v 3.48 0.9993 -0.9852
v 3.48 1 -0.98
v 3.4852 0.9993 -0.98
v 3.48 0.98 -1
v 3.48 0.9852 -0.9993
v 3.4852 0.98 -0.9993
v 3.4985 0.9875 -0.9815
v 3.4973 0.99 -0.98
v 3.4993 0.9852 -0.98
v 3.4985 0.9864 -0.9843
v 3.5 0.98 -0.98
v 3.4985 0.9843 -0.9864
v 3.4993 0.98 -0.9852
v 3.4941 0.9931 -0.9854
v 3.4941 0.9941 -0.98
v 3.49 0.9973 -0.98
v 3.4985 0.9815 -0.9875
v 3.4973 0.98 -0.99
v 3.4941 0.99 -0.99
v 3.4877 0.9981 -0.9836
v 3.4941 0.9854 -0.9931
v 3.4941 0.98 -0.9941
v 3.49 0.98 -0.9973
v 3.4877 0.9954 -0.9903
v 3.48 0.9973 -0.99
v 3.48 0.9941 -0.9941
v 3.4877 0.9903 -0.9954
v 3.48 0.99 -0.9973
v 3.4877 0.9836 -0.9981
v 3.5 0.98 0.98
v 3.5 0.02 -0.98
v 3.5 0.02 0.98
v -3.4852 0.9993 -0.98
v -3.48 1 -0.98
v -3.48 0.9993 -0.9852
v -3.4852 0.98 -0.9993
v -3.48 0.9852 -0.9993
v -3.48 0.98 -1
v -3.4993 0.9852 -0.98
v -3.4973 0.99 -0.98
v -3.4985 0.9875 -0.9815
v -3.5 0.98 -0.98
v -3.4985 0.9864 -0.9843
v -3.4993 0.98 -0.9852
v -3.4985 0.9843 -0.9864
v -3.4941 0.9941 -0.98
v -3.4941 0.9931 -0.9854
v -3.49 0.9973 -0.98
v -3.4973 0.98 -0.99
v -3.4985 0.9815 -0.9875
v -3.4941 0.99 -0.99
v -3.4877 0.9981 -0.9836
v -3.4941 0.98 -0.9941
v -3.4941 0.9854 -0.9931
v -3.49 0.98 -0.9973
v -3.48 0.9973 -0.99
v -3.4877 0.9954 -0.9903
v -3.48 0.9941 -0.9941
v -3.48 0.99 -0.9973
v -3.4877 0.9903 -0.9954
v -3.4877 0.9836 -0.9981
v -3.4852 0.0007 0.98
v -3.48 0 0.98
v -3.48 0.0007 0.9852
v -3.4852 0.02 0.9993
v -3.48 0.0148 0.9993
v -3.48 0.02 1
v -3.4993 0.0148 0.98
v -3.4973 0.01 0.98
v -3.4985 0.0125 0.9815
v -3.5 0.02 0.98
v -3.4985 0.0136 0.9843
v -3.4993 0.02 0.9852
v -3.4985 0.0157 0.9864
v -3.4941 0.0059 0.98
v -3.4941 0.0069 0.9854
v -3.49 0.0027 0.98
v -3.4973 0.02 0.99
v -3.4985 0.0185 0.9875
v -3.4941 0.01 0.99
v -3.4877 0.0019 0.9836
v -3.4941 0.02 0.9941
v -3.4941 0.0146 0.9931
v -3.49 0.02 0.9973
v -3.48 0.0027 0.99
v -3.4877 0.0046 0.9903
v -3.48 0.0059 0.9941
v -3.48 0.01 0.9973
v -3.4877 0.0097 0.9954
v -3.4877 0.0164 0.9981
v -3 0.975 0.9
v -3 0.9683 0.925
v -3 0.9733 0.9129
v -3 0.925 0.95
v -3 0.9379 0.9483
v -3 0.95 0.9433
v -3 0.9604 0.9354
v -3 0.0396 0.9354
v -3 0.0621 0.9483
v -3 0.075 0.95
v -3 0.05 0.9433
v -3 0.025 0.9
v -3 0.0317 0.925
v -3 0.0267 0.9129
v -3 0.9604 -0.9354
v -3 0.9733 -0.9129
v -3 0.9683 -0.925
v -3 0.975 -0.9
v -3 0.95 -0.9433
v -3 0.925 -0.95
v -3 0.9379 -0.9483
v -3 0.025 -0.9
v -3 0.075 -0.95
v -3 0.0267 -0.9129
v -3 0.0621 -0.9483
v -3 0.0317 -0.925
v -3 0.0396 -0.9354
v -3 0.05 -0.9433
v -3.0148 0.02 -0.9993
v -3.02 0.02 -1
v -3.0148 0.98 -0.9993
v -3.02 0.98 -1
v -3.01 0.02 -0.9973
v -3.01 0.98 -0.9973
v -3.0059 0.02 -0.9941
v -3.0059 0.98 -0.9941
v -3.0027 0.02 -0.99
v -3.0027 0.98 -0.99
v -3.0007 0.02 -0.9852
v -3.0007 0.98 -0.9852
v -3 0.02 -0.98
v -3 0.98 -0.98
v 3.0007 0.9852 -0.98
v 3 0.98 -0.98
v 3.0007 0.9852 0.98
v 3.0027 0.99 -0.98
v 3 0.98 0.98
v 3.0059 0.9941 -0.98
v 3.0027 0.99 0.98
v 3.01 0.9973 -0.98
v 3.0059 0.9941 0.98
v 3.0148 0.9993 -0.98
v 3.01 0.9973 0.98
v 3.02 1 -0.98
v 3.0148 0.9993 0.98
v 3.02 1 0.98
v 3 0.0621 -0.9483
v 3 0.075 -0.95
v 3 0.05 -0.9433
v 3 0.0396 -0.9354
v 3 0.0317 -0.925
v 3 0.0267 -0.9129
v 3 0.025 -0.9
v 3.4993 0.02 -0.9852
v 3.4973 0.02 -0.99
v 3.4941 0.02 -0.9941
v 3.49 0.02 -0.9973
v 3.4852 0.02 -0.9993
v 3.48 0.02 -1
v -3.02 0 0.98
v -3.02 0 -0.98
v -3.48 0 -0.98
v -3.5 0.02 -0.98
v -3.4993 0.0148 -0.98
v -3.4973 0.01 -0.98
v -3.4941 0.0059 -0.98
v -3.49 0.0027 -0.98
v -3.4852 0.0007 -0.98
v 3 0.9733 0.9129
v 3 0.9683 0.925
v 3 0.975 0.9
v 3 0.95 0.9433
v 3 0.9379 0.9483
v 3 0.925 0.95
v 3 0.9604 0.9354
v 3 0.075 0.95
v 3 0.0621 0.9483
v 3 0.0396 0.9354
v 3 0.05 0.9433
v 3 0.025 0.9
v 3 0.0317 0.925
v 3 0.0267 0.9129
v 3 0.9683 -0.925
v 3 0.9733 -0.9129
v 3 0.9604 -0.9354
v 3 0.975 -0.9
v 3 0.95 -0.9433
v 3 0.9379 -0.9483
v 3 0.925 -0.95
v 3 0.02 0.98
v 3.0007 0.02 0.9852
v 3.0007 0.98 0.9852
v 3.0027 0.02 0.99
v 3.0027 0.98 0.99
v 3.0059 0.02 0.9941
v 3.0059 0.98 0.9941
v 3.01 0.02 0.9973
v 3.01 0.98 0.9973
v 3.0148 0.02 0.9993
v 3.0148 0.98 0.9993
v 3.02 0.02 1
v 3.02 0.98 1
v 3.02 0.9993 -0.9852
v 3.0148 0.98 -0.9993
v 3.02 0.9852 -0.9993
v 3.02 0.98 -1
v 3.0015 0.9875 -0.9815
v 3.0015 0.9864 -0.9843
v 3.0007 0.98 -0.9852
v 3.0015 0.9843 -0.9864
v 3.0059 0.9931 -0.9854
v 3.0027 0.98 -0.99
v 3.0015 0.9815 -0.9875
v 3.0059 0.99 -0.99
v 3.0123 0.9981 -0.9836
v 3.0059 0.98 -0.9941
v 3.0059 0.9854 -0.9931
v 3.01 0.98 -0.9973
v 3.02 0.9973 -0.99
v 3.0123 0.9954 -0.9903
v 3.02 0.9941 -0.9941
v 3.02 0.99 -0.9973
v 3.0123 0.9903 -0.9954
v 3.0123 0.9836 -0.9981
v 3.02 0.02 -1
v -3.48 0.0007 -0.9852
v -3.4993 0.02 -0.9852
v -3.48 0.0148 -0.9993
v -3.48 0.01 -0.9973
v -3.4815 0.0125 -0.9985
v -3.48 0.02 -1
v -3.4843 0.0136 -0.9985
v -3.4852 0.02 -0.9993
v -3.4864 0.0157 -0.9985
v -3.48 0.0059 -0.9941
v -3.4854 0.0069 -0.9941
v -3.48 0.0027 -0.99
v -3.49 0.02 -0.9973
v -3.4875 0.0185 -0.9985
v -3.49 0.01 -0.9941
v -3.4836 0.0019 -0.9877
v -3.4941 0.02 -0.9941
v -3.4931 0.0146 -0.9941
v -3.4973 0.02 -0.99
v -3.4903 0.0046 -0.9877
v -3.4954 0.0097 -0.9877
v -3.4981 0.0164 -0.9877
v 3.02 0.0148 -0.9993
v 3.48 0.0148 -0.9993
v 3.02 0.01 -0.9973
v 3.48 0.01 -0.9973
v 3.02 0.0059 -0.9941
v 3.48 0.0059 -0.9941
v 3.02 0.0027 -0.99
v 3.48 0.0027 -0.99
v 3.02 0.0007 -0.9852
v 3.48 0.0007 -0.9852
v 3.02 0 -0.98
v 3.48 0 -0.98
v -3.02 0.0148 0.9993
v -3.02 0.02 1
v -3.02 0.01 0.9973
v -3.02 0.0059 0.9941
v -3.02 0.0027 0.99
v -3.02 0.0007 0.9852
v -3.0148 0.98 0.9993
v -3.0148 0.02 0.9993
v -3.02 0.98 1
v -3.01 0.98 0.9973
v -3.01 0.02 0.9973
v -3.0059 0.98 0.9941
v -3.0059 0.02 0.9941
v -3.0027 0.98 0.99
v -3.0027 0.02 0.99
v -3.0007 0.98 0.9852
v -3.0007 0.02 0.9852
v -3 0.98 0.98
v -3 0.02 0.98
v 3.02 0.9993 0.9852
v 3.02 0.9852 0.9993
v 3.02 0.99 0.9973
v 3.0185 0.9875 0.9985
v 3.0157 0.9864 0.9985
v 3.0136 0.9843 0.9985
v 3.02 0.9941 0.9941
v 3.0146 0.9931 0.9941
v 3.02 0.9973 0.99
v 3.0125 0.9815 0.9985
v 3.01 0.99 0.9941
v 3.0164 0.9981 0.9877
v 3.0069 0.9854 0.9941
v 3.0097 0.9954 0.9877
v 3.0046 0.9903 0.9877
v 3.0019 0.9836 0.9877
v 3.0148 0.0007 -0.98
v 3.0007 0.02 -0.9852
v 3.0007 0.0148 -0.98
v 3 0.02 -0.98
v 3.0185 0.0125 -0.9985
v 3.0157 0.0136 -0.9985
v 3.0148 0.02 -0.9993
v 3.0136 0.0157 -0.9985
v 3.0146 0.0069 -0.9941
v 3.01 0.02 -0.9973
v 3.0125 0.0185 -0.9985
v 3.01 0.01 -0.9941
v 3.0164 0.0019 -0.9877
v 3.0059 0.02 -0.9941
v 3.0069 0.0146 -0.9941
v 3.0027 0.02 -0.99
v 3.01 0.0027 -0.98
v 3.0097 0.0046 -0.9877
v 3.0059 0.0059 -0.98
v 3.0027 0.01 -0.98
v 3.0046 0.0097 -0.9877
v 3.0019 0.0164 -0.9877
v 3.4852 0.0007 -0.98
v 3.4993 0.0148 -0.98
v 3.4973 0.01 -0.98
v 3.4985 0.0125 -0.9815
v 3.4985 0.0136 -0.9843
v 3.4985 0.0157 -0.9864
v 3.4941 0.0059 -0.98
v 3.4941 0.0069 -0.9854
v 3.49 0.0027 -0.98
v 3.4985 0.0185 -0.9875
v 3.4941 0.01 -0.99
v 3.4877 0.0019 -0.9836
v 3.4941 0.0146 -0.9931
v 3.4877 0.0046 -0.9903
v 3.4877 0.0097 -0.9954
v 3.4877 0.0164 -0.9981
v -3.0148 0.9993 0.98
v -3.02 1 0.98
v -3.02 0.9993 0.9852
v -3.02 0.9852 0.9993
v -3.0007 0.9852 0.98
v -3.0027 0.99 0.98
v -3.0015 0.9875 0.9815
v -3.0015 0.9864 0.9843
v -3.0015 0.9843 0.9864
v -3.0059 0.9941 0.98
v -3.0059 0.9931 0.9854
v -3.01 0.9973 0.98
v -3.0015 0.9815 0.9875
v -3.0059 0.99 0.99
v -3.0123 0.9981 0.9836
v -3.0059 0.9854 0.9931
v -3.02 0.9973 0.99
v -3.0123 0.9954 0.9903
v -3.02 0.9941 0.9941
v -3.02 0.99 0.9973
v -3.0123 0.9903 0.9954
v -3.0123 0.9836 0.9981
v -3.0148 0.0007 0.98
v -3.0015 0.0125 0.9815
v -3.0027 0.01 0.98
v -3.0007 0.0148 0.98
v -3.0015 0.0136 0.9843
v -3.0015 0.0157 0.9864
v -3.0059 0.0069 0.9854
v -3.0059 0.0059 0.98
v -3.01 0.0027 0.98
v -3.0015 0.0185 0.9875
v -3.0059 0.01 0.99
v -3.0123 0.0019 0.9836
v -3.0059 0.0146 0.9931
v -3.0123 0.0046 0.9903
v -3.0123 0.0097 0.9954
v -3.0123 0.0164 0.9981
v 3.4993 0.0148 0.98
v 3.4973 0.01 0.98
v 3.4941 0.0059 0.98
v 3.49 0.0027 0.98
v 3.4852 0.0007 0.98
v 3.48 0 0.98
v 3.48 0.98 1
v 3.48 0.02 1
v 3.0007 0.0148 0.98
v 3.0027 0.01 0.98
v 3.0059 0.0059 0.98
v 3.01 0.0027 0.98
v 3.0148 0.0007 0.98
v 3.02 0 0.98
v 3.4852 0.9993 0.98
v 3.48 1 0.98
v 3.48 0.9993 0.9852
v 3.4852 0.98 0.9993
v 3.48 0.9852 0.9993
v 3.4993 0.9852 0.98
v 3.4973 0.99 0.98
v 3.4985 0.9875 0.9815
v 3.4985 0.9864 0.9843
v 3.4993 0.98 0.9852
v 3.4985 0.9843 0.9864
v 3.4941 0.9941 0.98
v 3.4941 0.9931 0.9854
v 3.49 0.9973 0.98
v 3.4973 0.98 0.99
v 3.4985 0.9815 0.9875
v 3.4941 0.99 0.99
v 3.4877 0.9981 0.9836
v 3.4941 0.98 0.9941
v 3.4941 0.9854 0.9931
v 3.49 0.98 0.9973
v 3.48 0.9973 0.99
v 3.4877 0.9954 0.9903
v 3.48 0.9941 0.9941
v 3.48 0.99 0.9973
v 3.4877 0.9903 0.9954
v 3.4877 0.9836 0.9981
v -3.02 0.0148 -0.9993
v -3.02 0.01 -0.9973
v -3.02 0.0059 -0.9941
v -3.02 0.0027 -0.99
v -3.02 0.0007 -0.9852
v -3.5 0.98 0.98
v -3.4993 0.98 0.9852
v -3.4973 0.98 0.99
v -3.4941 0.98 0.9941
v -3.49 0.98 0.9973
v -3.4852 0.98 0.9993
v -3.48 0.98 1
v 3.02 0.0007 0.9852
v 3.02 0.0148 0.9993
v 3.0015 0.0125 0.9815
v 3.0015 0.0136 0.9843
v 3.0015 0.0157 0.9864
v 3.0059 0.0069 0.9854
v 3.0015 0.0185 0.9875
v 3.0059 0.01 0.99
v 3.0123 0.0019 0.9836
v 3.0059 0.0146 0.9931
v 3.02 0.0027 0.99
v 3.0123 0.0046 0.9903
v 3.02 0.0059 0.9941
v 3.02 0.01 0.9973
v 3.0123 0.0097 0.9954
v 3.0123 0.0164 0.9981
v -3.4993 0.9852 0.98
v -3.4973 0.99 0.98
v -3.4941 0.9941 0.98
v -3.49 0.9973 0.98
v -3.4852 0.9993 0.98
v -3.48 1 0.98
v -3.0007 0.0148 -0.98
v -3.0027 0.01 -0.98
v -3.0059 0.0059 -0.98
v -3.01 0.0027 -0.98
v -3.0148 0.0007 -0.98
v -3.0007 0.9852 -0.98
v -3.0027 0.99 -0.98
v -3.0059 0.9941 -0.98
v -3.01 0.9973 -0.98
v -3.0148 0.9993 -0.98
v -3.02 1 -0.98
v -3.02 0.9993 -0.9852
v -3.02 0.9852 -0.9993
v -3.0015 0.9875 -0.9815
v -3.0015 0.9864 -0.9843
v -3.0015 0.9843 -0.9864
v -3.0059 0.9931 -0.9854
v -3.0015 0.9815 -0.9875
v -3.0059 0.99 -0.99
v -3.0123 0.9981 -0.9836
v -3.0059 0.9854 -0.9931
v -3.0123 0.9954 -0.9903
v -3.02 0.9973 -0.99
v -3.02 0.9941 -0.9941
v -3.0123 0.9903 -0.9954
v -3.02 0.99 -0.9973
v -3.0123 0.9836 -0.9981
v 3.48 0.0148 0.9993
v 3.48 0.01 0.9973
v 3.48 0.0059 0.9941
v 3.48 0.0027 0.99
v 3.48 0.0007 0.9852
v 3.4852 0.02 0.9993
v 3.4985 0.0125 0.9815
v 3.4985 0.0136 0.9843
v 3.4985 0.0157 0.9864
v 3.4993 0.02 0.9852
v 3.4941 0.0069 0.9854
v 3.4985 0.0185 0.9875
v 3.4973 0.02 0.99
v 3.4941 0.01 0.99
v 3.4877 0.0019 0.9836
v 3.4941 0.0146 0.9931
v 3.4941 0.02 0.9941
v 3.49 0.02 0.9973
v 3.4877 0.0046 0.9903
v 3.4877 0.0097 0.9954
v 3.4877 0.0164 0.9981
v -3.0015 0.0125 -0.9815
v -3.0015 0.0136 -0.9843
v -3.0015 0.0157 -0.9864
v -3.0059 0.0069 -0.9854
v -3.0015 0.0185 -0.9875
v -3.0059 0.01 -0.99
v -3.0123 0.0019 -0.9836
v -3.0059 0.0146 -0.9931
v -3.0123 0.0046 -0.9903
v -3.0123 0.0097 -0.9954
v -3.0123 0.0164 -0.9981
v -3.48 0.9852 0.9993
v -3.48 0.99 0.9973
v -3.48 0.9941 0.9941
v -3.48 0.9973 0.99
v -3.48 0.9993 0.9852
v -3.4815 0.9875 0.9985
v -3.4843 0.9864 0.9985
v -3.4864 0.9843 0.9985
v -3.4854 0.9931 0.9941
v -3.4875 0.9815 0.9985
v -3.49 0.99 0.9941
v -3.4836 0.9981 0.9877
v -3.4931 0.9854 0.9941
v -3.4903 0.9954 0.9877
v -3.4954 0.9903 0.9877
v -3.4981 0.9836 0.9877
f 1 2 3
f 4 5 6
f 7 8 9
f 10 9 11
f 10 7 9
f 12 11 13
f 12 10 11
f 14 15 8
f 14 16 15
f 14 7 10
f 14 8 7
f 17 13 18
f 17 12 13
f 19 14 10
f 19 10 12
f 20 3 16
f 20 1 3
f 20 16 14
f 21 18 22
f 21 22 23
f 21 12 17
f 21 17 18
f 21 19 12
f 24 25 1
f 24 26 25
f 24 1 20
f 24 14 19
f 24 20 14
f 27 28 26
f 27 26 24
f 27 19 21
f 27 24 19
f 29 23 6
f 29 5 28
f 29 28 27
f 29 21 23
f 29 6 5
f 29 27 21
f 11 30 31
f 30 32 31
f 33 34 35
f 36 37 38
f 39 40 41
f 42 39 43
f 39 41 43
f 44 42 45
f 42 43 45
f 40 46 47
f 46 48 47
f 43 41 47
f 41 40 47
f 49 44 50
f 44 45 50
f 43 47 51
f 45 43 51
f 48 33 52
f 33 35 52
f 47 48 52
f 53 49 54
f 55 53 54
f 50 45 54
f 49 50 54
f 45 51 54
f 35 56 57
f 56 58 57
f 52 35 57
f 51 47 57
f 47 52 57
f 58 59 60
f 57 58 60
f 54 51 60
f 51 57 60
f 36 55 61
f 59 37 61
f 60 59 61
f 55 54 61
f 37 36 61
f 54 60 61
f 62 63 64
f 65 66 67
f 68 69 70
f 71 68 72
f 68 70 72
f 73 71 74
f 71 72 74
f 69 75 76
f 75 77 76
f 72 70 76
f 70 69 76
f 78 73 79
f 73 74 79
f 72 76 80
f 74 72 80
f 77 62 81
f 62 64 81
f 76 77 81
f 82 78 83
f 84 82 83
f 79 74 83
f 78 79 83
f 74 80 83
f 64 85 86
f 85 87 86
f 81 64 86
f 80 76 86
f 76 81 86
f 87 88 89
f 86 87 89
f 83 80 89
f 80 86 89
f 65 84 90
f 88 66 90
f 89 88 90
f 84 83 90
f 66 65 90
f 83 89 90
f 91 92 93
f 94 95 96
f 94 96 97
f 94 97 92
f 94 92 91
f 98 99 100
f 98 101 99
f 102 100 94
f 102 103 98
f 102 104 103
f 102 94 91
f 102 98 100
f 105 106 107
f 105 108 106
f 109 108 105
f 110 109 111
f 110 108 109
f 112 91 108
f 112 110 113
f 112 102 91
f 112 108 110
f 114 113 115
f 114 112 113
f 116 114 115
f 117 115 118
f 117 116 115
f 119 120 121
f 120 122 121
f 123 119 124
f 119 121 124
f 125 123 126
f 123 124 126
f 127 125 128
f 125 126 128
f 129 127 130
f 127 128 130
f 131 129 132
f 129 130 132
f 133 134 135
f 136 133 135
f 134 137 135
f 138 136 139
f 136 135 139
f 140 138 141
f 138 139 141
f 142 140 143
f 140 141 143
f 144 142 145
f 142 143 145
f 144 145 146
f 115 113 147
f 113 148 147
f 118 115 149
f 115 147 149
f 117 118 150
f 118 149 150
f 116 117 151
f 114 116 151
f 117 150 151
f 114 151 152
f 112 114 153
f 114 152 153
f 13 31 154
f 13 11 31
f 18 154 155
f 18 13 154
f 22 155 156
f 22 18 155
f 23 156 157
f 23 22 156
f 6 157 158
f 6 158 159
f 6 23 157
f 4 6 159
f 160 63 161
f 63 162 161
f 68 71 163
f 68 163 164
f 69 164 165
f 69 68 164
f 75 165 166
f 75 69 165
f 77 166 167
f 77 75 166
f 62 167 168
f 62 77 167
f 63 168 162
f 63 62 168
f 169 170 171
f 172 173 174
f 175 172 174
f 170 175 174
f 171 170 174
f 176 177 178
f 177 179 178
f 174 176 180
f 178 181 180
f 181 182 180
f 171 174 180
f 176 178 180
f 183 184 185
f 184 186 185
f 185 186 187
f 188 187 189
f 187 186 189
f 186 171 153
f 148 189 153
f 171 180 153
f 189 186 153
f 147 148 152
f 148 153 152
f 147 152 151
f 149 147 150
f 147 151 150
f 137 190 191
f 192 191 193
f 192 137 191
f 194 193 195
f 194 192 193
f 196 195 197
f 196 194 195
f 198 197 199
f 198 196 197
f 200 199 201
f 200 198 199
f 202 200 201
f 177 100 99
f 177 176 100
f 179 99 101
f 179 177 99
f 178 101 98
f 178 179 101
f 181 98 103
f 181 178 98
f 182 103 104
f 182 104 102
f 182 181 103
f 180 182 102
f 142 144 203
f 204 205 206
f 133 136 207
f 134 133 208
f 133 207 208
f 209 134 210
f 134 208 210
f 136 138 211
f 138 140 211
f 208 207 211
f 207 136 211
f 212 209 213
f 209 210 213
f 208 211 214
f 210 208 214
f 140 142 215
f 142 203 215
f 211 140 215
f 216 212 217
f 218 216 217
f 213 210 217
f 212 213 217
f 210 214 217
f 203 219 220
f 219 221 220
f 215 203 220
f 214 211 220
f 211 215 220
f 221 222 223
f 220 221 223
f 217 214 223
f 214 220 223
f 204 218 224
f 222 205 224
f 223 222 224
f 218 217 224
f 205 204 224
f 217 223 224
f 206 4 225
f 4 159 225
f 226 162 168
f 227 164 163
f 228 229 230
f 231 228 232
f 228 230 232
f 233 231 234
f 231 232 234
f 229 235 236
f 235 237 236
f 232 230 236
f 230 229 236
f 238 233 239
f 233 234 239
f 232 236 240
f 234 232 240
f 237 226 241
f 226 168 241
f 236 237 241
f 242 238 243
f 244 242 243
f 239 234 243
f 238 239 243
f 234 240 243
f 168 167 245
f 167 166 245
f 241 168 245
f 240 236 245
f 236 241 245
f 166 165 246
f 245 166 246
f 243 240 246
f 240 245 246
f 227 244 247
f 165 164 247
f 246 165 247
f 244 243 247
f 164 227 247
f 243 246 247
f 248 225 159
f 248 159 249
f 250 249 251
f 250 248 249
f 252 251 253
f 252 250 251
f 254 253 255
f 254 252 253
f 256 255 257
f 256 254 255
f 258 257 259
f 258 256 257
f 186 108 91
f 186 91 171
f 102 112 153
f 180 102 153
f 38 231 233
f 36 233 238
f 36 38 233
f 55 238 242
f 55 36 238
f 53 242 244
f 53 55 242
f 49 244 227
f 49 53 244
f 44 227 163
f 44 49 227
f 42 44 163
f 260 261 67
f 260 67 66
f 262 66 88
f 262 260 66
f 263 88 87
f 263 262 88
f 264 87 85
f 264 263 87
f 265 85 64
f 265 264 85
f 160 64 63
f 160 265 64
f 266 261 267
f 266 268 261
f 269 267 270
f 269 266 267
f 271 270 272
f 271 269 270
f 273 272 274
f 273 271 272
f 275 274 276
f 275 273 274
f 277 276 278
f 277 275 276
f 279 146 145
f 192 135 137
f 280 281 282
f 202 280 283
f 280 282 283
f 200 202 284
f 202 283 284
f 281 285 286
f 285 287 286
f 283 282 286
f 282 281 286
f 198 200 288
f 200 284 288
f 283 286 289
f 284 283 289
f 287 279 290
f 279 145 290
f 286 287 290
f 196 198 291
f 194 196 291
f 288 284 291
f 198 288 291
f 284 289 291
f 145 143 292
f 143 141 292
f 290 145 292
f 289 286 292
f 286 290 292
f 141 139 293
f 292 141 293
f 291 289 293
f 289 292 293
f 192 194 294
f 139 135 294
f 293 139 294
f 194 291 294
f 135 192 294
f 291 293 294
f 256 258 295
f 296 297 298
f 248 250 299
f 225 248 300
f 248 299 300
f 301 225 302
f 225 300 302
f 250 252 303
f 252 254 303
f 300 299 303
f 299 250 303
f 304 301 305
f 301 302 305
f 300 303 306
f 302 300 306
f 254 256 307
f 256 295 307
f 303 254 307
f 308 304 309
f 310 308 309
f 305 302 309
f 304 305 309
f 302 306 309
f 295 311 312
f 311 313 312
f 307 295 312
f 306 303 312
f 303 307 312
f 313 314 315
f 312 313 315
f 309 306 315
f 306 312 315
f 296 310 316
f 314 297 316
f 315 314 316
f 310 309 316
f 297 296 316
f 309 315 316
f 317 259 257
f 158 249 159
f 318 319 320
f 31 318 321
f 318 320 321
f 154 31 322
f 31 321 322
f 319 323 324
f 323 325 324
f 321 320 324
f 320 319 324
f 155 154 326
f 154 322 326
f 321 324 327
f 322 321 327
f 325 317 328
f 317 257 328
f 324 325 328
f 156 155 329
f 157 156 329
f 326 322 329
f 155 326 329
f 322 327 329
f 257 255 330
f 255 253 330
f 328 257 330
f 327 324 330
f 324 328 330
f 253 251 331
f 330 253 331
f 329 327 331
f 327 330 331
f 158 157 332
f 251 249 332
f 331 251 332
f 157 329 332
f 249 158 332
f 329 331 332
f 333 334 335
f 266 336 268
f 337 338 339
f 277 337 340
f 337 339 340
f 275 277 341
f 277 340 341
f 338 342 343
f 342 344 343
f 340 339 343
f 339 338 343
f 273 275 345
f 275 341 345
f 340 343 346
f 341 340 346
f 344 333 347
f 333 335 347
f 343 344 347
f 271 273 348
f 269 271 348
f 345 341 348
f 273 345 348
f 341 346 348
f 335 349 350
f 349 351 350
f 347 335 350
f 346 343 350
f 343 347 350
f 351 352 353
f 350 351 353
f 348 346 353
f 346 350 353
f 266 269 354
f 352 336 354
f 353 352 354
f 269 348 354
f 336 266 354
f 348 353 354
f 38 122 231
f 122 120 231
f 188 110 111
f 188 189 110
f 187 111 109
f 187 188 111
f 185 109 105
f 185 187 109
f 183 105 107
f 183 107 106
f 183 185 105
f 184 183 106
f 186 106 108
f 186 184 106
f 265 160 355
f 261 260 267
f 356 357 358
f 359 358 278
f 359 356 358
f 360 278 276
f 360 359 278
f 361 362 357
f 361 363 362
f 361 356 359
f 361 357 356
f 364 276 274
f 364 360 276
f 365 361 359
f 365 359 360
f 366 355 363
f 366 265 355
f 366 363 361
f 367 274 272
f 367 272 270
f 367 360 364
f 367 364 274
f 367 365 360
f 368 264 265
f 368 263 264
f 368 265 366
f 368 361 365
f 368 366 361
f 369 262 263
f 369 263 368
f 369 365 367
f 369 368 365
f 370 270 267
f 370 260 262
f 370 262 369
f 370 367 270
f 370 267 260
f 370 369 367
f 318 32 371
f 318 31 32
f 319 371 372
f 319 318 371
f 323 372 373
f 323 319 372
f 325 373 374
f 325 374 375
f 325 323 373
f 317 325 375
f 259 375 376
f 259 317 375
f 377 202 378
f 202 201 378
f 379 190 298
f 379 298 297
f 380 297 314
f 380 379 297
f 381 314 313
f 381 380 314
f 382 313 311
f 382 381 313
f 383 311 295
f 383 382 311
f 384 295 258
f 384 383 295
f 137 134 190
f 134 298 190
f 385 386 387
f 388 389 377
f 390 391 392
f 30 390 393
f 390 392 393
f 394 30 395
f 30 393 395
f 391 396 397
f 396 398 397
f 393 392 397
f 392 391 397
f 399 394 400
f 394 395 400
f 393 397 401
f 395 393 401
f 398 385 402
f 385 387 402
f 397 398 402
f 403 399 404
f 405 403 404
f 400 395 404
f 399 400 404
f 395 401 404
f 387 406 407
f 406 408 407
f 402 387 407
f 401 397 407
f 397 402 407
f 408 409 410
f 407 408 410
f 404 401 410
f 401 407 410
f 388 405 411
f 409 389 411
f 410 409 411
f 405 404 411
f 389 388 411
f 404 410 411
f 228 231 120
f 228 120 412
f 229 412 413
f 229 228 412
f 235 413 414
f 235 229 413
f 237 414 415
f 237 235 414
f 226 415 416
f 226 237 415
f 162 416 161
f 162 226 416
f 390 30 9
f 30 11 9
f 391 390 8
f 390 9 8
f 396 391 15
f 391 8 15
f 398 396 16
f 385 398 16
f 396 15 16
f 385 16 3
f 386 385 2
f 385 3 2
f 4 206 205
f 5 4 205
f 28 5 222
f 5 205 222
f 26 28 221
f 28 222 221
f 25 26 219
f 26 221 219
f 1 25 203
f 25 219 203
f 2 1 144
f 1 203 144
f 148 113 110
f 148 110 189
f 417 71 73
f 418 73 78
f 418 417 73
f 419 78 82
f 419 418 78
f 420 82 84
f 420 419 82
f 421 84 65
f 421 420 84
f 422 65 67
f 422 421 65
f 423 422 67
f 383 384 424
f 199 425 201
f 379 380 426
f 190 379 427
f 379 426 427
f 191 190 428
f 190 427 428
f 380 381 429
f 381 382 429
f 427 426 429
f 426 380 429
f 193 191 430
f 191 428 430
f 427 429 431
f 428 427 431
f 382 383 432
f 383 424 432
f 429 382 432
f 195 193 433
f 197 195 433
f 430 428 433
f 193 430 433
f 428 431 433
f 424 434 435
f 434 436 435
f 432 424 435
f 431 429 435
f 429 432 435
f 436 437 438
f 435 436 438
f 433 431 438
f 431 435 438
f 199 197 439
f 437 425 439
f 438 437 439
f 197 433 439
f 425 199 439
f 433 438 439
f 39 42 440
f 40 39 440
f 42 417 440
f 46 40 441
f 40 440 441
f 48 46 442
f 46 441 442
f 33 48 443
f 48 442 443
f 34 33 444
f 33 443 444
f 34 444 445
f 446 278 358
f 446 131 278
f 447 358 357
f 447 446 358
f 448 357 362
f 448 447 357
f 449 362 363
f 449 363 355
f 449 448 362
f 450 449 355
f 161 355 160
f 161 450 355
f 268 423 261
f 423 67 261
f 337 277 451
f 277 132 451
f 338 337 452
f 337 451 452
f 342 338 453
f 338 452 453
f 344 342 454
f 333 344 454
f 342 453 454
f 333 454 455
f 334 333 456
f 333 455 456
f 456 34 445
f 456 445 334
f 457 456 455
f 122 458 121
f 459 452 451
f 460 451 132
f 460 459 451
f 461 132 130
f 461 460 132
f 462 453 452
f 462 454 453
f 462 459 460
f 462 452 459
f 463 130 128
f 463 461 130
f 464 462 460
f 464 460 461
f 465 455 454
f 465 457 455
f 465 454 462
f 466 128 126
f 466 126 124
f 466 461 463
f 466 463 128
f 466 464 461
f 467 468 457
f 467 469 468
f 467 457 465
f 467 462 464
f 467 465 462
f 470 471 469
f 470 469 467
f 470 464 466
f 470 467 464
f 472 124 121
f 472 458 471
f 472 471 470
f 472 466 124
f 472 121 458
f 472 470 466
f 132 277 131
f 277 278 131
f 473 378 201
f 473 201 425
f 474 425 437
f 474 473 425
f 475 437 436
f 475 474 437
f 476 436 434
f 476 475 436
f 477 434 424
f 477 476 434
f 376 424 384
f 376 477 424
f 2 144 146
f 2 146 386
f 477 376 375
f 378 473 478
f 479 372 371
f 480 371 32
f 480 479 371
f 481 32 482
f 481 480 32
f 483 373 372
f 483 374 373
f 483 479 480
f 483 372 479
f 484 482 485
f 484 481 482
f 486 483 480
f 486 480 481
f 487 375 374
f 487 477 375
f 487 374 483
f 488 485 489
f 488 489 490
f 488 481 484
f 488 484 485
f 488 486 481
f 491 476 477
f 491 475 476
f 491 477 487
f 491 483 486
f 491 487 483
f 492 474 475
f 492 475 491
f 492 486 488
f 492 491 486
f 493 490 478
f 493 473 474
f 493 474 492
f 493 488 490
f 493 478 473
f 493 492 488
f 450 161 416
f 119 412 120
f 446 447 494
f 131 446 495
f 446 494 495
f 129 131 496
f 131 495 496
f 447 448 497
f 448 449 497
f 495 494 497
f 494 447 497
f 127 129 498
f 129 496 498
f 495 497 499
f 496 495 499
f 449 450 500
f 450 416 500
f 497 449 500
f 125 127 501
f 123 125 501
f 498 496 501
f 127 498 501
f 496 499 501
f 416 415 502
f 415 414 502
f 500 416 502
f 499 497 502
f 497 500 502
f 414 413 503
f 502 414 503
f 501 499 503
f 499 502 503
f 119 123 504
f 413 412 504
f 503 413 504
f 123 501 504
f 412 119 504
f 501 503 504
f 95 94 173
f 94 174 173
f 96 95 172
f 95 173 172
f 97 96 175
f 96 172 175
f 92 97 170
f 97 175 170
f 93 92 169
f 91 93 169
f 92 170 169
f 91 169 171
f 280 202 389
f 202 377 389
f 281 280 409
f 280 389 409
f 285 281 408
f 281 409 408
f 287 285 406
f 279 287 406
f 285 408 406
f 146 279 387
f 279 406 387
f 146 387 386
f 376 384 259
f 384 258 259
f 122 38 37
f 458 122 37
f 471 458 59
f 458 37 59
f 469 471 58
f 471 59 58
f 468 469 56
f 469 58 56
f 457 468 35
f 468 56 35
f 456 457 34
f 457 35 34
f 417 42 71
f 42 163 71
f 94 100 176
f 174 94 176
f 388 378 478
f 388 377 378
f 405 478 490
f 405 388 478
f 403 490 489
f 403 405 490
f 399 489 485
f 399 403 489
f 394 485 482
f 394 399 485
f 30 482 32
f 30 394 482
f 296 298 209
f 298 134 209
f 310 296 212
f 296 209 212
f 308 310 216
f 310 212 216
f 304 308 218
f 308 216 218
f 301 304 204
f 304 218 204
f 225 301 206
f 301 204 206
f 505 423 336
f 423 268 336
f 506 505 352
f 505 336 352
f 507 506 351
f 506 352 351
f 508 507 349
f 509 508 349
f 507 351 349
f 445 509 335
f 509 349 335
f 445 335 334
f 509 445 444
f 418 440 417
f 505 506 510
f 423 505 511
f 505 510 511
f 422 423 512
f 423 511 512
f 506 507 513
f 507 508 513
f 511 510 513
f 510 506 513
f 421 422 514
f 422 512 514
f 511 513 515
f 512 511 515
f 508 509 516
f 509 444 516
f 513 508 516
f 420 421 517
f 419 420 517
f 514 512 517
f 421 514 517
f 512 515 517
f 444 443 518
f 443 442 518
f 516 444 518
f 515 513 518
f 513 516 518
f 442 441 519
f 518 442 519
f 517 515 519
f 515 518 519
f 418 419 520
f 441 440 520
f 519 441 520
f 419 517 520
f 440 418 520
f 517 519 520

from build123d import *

# Parameters (mm, degrees)
SKIZZE1_W                         = 0.5
SKIZZE1_H                         = 2
AUFSATZ_LINEAR_AUSTRAGEN1_DEPTH   = 1
AUFSATZ_LINEAR_AUSTRAGEN1_2_DEPTH = 1
AUFSATZ_LINEAR_START              = 0.025
SKIZZE1_3_W                       = 6
SKIZZE1_3_H                       = 1.9
AUFSATZ_LINEAR_AUSTRAGEN2_DEPTH   = 0.95
VERRUNDUNG1_R                     = 0.02
VERRUNDUNG3_R                     = 0.02
VERRUNDUNG4_R                     = 0.05


with BuildPart() as part:
    # Skizze1 → Aufsatz-Linear austragen1 (new body)
    with BuildSketch(Plane(origin=(0, 0, 0), x_dir=(1, 0, 0), z_dir=(0, 1, 0))):
        with Locations((-3.25, 0)):
            Rectangle(SKIZZE1_W, SKIZZE1_H)
    extrude(amount=AUFSATZ_LINEAR_AUSTRAGEN1_DEPTH)

    # Verrundung1
    verrundung1_edges = [part.edges().sort_by_distance(p)[0] for p in [
        (-3, 0.5, 1),
        (-3, 1, 0),
        (-3, 0.5, -1),
        (-3, 0, 0),
        (-3.5, 0.5, -1),
        (-3.5, 1, 0),
        (-3.5, 0.5, 1),
        (-3.5, 0, 0),
        (-3.25, 0, -1),
        (-3.25, 1, -1),
        (-3.25, 1, 1),
        (-3.25, 0, 1),
    ]]
    fillet(verrundung1_edges, radius=VERRUNDUNG1_R)


with BuildPart() as body_2:
    # Skizze1 → Aufsatz-Linear austragen1 2 (new body)
    with BuildSketch(Plane(origin=(0, 0, 0), x_dir=(1, 0, 0), z_dir=(0, 1, 0))):
        with Locations((3.25, 0)):
            Rectangle(SKIZZE1_W, SKIZZE1_H)
    extrude(amount=AUFSATZ_LINEAR_AUSTRAGEN1_2_DEPTH)

    # Verrundung3
    verrundung3_edges = [body_2.edges().sort_by_distance(p)[0] for p in [
        (3.25, 0, -1),
        (3, 0.5, -1),
        (3, 0, 0),
        (3, 0.5, 1),
        (3.25, 0, 1),
        (3.25, 1, 1),
        (3, 1, 0),
        (3.25, 1, -1),
        (3.5, 0.5, 1),
        (3.5, 1, 0),
        (3.5, 0.5, -1),
        (3.5, 0, 0),
    ]]
    fillet(verrundung3_edges, radius=VERRUNDUNG3_R)


with BuildPart() as body_3:
    # Skizze1<3> → Aufsatz-Linear austragen2 (new body)
    with BuildSketch(Plane(origin=(0, 0, 0), x_dir=(1, 0, 0), z_dir=(0, 1, 0)).offset(AUFSATZ_LINEAR_START)):
        Rectangle(SKIZZE1_3_W, SKIZZE1_3_H)
    extrude(amount=AUFSATZ_LINEAR_AUSTRAGEN2_DEPTH)

    # Verrundung4
    verrundung4_edges = [body_3.edges().sort_by_distance(p)[0] for p in [
        (0, 0.025, -0.95),
        (0, 0.975, -0.95),
        (0, 0.025, 0.95),
        (0, 0.975, 0.95),
    ]]
    fillet(verrundung4_edges, radius=VERRUNDUNG4_R)


solid = Compound([part.part, body_2.part, body_3.part])
